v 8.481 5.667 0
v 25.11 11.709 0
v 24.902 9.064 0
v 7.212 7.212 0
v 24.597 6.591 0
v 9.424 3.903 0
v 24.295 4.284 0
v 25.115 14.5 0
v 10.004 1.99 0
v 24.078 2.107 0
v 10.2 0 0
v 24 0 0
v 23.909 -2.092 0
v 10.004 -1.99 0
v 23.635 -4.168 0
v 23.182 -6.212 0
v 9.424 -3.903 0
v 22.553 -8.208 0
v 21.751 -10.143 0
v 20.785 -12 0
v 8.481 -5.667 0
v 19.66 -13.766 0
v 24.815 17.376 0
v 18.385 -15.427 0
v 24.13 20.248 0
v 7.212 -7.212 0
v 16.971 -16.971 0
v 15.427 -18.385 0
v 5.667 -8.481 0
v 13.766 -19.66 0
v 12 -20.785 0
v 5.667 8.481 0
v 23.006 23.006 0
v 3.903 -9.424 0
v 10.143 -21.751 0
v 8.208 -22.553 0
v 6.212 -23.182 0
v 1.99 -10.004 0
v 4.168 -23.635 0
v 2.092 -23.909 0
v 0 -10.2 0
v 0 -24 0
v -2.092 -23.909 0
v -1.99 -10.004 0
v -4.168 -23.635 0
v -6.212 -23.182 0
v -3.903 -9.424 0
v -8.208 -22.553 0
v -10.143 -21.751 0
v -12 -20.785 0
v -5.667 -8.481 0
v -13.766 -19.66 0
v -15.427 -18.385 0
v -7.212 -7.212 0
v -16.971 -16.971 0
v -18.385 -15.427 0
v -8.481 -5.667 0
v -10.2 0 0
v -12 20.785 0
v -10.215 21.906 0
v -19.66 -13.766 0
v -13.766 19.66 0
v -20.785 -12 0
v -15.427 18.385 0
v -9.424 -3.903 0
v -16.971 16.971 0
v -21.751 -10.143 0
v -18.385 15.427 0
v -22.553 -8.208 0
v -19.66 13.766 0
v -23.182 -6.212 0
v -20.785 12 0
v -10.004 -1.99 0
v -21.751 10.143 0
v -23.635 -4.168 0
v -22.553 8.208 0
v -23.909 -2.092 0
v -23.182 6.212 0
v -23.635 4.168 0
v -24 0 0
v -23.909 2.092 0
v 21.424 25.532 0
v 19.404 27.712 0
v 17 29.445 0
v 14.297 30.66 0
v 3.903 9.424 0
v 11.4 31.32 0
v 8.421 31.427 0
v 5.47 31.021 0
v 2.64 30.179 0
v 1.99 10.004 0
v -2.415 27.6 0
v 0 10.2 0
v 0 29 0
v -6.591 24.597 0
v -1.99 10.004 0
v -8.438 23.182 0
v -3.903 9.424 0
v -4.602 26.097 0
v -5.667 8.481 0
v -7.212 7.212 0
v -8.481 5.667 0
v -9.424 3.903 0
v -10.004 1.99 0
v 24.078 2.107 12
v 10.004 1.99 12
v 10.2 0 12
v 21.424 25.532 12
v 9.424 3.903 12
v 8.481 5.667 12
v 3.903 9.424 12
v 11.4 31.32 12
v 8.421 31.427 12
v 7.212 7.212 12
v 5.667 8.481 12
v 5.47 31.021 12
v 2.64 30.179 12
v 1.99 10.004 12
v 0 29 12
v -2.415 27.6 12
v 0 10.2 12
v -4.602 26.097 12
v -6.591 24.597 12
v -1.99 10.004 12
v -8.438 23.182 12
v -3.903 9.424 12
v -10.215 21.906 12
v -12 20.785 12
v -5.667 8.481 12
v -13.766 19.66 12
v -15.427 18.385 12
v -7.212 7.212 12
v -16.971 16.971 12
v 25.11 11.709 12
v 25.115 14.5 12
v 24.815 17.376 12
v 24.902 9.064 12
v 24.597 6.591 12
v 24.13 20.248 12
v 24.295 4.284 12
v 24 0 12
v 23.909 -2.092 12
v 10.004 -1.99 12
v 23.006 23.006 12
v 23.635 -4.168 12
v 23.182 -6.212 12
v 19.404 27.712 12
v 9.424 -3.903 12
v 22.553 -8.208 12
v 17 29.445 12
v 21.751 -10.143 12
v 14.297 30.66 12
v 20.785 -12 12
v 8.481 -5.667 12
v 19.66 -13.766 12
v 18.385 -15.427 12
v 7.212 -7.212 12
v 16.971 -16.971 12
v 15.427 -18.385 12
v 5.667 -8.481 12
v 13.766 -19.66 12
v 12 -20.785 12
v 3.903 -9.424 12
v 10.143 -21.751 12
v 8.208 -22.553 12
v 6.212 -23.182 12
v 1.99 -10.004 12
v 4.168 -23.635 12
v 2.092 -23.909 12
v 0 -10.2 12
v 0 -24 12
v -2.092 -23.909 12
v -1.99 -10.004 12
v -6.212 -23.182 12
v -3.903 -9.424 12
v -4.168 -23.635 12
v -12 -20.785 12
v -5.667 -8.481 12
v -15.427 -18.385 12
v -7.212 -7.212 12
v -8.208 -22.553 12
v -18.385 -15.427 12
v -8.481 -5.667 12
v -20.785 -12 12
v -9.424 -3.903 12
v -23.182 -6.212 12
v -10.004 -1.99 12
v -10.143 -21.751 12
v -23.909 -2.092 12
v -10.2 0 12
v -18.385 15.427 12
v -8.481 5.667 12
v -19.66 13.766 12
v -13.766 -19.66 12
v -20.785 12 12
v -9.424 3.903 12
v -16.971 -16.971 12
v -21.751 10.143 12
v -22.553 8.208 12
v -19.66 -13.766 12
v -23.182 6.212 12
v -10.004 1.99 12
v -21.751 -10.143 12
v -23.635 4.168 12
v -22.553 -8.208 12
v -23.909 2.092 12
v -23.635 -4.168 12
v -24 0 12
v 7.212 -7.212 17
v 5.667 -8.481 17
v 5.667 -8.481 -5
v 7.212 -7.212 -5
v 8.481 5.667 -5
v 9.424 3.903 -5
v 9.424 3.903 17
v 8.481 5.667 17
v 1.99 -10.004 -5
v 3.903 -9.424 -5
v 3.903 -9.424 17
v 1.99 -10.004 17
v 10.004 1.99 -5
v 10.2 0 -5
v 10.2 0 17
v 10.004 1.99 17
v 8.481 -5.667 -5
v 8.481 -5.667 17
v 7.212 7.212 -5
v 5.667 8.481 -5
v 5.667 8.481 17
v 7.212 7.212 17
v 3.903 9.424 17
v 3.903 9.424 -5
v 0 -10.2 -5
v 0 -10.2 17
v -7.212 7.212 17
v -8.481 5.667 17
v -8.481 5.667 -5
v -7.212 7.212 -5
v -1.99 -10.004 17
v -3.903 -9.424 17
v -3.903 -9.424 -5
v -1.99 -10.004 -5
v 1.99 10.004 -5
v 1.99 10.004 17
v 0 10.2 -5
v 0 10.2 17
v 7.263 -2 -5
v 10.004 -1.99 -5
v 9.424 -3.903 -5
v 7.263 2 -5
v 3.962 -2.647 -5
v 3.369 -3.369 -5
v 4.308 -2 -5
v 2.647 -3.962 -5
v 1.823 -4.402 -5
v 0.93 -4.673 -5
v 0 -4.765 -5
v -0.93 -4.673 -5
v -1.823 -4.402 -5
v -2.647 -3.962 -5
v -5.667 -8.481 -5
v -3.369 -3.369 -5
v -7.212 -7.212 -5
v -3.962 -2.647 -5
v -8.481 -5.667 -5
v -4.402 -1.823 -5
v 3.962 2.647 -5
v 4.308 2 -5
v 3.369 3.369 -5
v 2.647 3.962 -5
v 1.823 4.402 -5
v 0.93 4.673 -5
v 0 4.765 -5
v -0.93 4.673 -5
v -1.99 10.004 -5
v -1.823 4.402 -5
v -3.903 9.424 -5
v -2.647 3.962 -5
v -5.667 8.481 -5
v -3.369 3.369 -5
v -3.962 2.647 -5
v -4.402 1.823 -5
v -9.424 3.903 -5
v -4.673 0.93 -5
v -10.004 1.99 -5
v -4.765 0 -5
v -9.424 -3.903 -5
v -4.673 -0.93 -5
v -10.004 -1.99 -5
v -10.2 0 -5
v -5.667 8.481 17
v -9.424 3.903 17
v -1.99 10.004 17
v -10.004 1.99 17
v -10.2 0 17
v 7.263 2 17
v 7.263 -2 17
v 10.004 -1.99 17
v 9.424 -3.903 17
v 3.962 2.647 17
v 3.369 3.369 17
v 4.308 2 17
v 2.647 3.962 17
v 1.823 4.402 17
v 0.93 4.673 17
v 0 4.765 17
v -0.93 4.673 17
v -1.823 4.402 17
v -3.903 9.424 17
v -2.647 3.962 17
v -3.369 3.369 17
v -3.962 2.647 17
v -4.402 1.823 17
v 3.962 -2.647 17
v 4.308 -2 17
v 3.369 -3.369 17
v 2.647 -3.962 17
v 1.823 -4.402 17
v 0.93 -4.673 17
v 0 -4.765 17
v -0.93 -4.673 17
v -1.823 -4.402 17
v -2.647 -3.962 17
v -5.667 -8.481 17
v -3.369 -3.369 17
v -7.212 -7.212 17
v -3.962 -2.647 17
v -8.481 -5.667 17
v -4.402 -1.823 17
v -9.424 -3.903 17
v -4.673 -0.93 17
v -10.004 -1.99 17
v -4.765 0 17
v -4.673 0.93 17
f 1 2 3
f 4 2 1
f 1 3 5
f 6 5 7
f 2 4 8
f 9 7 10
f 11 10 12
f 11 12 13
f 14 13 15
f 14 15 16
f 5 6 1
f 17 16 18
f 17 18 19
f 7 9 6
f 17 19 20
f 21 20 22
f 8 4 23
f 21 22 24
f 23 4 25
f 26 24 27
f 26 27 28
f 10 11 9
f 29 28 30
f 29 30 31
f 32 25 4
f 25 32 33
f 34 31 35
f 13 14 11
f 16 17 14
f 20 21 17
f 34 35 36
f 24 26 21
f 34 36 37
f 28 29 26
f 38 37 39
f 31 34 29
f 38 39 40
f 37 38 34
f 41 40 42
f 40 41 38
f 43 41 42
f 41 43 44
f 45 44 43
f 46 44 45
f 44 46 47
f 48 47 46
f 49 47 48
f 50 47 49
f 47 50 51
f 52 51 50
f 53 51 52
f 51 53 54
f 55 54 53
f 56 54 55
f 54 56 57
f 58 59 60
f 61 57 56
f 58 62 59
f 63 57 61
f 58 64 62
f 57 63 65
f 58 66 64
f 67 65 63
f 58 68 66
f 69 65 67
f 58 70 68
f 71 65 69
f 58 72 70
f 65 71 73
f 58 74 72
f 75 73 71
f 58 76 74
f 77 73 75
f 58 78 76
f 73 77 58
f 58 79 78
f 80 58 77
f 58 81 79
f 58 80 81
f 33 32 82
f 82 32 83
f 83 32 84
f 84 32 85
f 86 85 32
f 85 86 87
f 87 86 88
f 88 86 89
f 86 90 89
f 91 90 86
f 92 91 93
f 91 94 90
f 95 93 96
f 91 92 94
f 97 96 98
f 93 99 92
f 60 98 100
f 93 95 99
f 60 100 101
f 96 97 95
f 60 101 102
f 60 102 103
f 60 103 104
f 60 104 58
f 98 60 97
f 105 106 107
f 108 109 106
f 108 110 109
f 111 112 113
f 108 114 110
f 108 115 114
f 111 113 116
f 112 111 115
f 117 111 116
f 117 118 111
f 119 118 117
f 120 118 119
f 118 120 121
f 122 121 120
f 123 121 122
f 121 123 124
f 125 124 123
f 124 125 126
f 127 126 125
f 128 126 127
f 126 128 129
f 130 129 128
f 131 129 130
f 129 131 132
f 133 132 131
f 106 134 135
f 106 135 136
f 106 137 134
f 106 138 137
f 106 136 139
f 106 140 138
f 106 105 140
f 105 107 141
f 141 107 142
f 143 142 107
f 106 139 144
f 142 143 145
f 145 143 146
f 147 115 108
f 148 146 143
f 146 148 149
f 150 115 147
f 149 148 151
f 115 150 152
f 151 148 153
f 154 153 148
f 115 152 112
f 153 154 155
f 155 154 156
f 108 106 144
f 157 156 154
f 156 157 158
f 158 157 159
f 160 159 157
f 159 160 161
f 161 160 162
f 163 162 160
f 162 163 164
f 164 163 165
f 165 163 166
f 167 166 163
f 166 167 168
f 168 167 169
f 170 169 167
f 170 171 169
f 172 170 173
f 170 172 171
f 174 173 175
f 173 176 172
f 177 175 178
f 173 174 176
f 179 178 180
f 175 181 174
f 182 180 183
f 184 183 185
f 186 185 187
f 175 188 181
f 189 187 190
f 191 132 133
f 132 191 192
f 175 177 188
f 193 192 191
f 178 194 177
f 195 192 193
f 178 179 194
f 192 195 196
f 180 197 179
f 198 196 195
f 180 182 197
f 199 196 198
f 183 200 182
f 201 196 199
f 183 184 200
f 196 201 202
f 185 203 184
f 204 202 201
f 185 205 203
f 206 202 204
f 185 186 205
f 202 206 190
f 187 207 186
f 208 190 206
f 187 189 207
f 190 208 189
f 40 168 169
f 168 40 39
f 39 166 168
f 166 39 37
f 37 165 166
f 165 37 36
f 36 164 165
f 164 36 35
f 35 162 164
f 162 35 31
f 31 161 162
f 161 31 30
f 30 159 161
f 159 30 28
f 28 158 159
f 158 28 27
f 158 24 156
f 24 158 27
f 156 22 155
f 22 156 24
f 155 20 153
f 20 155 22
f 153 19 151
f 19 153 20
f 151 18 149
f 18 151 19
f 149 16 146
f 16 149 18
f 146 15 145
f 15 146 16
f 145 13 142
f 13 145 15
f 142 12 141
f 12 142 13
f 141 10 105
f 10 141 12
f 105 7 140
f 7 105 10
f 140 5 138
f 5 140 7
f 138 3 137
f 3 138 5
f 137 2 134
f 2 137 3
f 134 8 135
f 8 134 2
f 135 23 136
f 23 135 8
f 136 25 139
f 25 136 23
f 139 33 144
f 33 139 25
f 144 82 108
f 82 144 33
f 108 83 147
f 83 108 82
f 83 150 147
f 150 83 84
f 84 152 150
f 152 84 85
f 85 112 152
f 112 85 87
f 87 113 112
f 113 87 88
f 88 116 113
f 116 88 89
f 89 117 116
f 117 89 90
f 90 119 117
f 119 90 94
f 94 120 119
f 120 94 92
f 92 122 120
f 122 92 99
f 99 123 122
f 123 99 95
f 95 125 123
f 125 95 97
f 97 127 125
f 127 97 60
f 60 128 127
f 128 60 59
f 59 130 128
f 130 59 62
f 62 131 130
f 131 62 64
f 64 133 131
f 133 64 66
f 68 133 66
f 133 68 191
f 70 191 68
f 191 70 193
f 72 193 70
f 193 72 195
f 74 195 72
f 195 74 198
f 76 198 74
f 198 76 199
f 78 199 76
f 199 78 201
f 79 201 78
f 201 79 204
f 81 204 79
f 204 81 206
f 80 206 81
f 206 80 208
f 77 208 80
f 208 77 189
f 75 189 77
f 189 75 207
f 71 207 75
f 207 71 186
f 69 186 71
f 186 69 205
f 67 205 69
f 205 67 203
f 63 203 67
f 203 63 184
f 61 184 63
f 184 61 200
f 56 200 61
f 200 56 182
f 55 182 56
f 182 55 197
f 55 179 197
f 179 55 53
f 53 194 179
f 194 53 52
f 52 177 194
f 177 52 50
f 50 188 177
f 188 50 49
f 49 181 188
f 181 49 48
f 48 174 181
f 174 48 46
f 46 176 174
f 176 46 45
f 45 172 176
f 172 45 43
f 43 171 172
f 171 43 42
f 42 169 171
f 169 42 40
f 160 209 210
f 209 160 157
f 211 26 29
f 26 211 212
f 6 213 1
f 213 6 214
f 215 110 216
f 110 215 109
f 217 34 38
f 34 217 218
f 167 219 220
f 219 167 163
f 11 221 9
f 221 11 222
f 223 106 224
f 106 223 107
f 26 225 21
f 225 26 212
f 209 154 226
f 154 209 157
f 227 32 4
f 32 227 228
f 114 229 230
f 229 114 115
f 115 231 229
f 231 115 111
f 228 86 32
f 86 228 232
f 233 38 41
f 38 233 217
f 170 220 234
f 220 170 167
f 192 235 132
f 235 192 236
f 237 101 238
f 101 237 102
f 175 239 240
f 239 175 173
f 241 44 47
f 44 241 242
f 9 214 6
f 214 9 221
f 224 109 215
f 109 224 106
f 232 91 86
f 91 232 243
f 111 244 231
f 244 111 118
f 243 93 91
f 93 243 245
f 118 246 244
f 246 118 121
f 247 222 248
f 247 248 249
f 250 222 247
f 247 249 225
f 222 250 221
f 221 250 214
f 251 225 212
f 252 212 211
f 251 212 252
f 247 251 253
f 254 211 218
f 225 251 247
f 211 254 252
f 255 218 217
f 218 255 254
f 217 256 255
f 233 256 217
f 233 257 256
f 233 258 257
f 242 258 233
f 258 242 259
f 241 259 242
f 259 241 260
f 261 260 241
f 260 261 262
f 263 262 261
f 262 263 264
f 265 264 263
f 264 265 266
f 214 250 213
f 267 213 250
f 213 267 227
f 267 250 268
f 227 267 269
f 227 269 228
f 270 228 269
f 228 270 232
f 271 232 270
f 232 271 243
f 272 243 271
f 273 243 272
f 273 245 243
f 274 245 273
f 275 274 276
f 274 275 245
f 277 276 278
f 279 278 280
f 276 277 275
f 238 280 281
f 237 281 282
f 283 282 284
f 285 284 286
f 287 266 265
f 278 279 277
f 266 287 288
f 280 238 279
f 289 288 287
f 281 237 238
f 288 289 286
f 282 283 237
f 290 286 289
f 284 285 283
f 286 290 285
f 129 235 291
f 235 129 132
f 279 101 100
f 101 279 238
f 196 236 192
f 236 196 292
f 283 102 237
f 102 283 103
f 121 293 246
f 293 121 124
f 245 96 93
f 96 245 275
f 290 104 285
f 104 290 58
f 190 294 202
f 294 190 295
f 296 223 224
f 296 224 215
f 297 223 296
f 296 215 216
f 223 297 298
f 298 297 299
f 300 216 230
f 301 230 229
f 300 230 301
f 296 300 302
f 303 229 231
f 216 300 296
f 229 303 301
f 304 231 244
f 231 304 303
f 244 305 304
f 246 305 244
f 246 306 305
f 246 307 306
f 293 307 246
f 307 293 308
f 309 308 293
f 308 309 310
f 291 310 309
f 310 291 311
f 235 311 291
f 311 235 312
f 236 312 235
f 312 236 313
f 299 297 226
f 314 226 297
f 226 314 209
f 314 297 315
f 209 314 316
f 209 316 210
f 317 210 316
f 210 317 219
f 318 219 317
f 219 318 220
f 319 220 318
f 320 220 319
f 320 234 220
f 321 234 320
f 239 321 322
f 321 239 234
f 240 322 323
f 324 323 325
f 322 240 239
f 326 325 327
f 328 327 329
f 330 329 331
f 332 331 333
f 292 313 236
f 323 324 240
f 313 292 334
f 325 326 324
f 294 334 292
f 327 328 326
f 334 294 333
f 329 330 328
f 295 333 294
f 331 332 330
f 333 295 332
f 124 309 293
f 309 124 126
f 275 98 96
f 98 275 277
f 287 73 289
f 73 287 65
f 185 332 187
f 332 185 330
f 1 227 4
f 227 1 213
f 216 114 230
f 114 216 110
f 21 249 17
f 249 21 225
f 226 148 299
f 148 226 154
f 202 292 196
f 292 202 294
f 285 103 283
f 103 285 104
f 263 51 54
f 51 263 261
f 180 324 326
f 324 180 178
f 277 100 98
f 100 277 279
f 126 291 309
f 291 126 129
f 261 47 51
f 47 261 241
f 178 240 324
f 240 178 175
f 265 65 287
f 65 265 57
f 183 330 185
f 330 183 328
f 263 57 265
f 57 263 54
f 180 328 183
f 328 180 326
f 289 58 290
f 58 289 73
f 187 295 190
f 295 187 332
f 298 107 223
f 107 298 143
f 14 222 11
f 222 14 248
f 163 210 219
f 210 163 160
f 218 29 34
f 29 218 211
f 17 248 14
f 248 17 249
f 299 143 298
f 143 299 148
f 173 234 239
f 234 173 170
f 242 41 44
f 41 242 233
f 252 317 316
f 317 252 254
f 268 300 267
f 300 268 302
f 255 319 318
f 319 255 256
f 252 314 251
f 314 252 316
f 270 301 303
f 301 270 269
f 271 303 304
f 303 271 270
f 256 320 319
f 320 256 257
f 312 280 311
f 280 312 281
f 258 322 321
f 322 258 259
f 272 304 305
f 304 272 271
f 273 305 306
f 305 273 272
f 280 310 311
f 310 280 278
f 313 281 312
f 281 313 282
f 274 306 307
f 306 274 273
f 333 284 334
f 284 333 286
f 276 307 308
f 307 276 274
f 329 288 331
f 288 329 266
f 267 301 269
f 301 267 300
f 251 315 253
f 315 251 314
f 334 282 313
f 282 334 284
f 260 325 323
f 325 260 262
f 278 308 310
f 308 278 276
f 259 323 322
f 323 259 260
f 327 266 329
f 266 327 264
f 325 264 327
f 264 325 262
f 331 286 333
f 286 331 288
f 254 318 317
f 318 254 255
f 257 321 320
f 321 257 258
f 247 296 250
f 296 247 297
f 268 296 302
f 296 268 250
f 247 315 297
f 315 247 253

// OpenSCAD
$fn = 32;

// ----------------------------------------------------------------------
// Cam: base radius 24 mm with a 10 mm lift over 120 degrees
// ----------------------------------------------------------------------

// --- parameters (mm) ---
base_r = 24;              // base radius
lift = 10;                // lift height above the base radius
lift_span = 120;          // angular width of the lift
lift_start = 0;           // angle where the lift starts
cam_t = 12;               // cam plate thickness
hub_d = 20.4;             // hub diameter
hub_h = 22;               // hub height
bore_d = 9.53;            // bore
key_w = 4;                // keyway width
key_depth = 2;            // keyway depth

cam_profile = [[24, 0], [24.078, 2.107], [24.295, 4.284], [24.597, 6.591], [24.902, 9.064], [25.11, 11.709], [25.115, 14.5], [24.815, 17.376], [24.13, 20.248], [23.006, 23.006], [21.424, 25.532], [19.404, 27.712], [17, 29.445], [14.297, 30.66], [11.4, 31.32], [8.421, 31.427], [5.47, 31.021], [2.64, 30.179], [0, 29], [-2.415, 27.6], [-4.602, 26.097], [-6.591, 24.597], [-8.438, 23.182], [-10.215, 21.906], [-12, 20.785], [-13.766, 19.66], [-15.427, 18.385], [-16.971, 16.971], [-18.385, 15.427], [-19.66, 13.766], [-20.785, 12], [-21.751, 10.143], [-22.553, 8.208], [-23.182, 6.212], [-23.635, 4.168], [-23.909, 2.092], [-24, 0], [-23.909, -2.092], [-23.635, -4.168], [-23.182, -6.212], [-22.553, -8.208], [-21.751, -10.143], [-20.785, -12], [-19.66, -13.766], [-18.385, -15.427], [-16.971, -16.971], [-15.427, -18.385], [-13.766, -19.66], [-12, -20.785], [-10.143, -21.751], [-8.208, -22.553], [-6.212, -23.182], [-4.168, -23.635], [-2.092, -23.909], [0, -24], [2.092, -23.909], [4.168, -23.635], [6.212, -23.182], [8.208, -22.553], [10.143, -21.751], [12, -20.785], [13.766, -19.66], [15.427, -18.385], [16.971, -16.971], [18.385, -15.427], [19.66, -13.766], [20.785, -12], [21.751, -10.143], [22.553, -8.208], [23.182, -6.212], [23.635, -4.168], [23.909, -2.092]];

difference() {
  union() {
    linear_extrude(height = cam_t) polygon(cam_profile);
    /* hub, proud of the cam plate on both sides */
    translate([0, 0, -5]) cylinder(h = hub_h, d = hub_d);
  }
  /* bore through the hub, 2.5 mm clear on both faces */
  translate([0, 0, -7.5]) cylinder(h = hub_h + 5, d = bore_d);
  /* keyway, milled through the whole hub */
  translate([2.763, -2, -7.5]) cube([4.5, 4, 27]);
}
